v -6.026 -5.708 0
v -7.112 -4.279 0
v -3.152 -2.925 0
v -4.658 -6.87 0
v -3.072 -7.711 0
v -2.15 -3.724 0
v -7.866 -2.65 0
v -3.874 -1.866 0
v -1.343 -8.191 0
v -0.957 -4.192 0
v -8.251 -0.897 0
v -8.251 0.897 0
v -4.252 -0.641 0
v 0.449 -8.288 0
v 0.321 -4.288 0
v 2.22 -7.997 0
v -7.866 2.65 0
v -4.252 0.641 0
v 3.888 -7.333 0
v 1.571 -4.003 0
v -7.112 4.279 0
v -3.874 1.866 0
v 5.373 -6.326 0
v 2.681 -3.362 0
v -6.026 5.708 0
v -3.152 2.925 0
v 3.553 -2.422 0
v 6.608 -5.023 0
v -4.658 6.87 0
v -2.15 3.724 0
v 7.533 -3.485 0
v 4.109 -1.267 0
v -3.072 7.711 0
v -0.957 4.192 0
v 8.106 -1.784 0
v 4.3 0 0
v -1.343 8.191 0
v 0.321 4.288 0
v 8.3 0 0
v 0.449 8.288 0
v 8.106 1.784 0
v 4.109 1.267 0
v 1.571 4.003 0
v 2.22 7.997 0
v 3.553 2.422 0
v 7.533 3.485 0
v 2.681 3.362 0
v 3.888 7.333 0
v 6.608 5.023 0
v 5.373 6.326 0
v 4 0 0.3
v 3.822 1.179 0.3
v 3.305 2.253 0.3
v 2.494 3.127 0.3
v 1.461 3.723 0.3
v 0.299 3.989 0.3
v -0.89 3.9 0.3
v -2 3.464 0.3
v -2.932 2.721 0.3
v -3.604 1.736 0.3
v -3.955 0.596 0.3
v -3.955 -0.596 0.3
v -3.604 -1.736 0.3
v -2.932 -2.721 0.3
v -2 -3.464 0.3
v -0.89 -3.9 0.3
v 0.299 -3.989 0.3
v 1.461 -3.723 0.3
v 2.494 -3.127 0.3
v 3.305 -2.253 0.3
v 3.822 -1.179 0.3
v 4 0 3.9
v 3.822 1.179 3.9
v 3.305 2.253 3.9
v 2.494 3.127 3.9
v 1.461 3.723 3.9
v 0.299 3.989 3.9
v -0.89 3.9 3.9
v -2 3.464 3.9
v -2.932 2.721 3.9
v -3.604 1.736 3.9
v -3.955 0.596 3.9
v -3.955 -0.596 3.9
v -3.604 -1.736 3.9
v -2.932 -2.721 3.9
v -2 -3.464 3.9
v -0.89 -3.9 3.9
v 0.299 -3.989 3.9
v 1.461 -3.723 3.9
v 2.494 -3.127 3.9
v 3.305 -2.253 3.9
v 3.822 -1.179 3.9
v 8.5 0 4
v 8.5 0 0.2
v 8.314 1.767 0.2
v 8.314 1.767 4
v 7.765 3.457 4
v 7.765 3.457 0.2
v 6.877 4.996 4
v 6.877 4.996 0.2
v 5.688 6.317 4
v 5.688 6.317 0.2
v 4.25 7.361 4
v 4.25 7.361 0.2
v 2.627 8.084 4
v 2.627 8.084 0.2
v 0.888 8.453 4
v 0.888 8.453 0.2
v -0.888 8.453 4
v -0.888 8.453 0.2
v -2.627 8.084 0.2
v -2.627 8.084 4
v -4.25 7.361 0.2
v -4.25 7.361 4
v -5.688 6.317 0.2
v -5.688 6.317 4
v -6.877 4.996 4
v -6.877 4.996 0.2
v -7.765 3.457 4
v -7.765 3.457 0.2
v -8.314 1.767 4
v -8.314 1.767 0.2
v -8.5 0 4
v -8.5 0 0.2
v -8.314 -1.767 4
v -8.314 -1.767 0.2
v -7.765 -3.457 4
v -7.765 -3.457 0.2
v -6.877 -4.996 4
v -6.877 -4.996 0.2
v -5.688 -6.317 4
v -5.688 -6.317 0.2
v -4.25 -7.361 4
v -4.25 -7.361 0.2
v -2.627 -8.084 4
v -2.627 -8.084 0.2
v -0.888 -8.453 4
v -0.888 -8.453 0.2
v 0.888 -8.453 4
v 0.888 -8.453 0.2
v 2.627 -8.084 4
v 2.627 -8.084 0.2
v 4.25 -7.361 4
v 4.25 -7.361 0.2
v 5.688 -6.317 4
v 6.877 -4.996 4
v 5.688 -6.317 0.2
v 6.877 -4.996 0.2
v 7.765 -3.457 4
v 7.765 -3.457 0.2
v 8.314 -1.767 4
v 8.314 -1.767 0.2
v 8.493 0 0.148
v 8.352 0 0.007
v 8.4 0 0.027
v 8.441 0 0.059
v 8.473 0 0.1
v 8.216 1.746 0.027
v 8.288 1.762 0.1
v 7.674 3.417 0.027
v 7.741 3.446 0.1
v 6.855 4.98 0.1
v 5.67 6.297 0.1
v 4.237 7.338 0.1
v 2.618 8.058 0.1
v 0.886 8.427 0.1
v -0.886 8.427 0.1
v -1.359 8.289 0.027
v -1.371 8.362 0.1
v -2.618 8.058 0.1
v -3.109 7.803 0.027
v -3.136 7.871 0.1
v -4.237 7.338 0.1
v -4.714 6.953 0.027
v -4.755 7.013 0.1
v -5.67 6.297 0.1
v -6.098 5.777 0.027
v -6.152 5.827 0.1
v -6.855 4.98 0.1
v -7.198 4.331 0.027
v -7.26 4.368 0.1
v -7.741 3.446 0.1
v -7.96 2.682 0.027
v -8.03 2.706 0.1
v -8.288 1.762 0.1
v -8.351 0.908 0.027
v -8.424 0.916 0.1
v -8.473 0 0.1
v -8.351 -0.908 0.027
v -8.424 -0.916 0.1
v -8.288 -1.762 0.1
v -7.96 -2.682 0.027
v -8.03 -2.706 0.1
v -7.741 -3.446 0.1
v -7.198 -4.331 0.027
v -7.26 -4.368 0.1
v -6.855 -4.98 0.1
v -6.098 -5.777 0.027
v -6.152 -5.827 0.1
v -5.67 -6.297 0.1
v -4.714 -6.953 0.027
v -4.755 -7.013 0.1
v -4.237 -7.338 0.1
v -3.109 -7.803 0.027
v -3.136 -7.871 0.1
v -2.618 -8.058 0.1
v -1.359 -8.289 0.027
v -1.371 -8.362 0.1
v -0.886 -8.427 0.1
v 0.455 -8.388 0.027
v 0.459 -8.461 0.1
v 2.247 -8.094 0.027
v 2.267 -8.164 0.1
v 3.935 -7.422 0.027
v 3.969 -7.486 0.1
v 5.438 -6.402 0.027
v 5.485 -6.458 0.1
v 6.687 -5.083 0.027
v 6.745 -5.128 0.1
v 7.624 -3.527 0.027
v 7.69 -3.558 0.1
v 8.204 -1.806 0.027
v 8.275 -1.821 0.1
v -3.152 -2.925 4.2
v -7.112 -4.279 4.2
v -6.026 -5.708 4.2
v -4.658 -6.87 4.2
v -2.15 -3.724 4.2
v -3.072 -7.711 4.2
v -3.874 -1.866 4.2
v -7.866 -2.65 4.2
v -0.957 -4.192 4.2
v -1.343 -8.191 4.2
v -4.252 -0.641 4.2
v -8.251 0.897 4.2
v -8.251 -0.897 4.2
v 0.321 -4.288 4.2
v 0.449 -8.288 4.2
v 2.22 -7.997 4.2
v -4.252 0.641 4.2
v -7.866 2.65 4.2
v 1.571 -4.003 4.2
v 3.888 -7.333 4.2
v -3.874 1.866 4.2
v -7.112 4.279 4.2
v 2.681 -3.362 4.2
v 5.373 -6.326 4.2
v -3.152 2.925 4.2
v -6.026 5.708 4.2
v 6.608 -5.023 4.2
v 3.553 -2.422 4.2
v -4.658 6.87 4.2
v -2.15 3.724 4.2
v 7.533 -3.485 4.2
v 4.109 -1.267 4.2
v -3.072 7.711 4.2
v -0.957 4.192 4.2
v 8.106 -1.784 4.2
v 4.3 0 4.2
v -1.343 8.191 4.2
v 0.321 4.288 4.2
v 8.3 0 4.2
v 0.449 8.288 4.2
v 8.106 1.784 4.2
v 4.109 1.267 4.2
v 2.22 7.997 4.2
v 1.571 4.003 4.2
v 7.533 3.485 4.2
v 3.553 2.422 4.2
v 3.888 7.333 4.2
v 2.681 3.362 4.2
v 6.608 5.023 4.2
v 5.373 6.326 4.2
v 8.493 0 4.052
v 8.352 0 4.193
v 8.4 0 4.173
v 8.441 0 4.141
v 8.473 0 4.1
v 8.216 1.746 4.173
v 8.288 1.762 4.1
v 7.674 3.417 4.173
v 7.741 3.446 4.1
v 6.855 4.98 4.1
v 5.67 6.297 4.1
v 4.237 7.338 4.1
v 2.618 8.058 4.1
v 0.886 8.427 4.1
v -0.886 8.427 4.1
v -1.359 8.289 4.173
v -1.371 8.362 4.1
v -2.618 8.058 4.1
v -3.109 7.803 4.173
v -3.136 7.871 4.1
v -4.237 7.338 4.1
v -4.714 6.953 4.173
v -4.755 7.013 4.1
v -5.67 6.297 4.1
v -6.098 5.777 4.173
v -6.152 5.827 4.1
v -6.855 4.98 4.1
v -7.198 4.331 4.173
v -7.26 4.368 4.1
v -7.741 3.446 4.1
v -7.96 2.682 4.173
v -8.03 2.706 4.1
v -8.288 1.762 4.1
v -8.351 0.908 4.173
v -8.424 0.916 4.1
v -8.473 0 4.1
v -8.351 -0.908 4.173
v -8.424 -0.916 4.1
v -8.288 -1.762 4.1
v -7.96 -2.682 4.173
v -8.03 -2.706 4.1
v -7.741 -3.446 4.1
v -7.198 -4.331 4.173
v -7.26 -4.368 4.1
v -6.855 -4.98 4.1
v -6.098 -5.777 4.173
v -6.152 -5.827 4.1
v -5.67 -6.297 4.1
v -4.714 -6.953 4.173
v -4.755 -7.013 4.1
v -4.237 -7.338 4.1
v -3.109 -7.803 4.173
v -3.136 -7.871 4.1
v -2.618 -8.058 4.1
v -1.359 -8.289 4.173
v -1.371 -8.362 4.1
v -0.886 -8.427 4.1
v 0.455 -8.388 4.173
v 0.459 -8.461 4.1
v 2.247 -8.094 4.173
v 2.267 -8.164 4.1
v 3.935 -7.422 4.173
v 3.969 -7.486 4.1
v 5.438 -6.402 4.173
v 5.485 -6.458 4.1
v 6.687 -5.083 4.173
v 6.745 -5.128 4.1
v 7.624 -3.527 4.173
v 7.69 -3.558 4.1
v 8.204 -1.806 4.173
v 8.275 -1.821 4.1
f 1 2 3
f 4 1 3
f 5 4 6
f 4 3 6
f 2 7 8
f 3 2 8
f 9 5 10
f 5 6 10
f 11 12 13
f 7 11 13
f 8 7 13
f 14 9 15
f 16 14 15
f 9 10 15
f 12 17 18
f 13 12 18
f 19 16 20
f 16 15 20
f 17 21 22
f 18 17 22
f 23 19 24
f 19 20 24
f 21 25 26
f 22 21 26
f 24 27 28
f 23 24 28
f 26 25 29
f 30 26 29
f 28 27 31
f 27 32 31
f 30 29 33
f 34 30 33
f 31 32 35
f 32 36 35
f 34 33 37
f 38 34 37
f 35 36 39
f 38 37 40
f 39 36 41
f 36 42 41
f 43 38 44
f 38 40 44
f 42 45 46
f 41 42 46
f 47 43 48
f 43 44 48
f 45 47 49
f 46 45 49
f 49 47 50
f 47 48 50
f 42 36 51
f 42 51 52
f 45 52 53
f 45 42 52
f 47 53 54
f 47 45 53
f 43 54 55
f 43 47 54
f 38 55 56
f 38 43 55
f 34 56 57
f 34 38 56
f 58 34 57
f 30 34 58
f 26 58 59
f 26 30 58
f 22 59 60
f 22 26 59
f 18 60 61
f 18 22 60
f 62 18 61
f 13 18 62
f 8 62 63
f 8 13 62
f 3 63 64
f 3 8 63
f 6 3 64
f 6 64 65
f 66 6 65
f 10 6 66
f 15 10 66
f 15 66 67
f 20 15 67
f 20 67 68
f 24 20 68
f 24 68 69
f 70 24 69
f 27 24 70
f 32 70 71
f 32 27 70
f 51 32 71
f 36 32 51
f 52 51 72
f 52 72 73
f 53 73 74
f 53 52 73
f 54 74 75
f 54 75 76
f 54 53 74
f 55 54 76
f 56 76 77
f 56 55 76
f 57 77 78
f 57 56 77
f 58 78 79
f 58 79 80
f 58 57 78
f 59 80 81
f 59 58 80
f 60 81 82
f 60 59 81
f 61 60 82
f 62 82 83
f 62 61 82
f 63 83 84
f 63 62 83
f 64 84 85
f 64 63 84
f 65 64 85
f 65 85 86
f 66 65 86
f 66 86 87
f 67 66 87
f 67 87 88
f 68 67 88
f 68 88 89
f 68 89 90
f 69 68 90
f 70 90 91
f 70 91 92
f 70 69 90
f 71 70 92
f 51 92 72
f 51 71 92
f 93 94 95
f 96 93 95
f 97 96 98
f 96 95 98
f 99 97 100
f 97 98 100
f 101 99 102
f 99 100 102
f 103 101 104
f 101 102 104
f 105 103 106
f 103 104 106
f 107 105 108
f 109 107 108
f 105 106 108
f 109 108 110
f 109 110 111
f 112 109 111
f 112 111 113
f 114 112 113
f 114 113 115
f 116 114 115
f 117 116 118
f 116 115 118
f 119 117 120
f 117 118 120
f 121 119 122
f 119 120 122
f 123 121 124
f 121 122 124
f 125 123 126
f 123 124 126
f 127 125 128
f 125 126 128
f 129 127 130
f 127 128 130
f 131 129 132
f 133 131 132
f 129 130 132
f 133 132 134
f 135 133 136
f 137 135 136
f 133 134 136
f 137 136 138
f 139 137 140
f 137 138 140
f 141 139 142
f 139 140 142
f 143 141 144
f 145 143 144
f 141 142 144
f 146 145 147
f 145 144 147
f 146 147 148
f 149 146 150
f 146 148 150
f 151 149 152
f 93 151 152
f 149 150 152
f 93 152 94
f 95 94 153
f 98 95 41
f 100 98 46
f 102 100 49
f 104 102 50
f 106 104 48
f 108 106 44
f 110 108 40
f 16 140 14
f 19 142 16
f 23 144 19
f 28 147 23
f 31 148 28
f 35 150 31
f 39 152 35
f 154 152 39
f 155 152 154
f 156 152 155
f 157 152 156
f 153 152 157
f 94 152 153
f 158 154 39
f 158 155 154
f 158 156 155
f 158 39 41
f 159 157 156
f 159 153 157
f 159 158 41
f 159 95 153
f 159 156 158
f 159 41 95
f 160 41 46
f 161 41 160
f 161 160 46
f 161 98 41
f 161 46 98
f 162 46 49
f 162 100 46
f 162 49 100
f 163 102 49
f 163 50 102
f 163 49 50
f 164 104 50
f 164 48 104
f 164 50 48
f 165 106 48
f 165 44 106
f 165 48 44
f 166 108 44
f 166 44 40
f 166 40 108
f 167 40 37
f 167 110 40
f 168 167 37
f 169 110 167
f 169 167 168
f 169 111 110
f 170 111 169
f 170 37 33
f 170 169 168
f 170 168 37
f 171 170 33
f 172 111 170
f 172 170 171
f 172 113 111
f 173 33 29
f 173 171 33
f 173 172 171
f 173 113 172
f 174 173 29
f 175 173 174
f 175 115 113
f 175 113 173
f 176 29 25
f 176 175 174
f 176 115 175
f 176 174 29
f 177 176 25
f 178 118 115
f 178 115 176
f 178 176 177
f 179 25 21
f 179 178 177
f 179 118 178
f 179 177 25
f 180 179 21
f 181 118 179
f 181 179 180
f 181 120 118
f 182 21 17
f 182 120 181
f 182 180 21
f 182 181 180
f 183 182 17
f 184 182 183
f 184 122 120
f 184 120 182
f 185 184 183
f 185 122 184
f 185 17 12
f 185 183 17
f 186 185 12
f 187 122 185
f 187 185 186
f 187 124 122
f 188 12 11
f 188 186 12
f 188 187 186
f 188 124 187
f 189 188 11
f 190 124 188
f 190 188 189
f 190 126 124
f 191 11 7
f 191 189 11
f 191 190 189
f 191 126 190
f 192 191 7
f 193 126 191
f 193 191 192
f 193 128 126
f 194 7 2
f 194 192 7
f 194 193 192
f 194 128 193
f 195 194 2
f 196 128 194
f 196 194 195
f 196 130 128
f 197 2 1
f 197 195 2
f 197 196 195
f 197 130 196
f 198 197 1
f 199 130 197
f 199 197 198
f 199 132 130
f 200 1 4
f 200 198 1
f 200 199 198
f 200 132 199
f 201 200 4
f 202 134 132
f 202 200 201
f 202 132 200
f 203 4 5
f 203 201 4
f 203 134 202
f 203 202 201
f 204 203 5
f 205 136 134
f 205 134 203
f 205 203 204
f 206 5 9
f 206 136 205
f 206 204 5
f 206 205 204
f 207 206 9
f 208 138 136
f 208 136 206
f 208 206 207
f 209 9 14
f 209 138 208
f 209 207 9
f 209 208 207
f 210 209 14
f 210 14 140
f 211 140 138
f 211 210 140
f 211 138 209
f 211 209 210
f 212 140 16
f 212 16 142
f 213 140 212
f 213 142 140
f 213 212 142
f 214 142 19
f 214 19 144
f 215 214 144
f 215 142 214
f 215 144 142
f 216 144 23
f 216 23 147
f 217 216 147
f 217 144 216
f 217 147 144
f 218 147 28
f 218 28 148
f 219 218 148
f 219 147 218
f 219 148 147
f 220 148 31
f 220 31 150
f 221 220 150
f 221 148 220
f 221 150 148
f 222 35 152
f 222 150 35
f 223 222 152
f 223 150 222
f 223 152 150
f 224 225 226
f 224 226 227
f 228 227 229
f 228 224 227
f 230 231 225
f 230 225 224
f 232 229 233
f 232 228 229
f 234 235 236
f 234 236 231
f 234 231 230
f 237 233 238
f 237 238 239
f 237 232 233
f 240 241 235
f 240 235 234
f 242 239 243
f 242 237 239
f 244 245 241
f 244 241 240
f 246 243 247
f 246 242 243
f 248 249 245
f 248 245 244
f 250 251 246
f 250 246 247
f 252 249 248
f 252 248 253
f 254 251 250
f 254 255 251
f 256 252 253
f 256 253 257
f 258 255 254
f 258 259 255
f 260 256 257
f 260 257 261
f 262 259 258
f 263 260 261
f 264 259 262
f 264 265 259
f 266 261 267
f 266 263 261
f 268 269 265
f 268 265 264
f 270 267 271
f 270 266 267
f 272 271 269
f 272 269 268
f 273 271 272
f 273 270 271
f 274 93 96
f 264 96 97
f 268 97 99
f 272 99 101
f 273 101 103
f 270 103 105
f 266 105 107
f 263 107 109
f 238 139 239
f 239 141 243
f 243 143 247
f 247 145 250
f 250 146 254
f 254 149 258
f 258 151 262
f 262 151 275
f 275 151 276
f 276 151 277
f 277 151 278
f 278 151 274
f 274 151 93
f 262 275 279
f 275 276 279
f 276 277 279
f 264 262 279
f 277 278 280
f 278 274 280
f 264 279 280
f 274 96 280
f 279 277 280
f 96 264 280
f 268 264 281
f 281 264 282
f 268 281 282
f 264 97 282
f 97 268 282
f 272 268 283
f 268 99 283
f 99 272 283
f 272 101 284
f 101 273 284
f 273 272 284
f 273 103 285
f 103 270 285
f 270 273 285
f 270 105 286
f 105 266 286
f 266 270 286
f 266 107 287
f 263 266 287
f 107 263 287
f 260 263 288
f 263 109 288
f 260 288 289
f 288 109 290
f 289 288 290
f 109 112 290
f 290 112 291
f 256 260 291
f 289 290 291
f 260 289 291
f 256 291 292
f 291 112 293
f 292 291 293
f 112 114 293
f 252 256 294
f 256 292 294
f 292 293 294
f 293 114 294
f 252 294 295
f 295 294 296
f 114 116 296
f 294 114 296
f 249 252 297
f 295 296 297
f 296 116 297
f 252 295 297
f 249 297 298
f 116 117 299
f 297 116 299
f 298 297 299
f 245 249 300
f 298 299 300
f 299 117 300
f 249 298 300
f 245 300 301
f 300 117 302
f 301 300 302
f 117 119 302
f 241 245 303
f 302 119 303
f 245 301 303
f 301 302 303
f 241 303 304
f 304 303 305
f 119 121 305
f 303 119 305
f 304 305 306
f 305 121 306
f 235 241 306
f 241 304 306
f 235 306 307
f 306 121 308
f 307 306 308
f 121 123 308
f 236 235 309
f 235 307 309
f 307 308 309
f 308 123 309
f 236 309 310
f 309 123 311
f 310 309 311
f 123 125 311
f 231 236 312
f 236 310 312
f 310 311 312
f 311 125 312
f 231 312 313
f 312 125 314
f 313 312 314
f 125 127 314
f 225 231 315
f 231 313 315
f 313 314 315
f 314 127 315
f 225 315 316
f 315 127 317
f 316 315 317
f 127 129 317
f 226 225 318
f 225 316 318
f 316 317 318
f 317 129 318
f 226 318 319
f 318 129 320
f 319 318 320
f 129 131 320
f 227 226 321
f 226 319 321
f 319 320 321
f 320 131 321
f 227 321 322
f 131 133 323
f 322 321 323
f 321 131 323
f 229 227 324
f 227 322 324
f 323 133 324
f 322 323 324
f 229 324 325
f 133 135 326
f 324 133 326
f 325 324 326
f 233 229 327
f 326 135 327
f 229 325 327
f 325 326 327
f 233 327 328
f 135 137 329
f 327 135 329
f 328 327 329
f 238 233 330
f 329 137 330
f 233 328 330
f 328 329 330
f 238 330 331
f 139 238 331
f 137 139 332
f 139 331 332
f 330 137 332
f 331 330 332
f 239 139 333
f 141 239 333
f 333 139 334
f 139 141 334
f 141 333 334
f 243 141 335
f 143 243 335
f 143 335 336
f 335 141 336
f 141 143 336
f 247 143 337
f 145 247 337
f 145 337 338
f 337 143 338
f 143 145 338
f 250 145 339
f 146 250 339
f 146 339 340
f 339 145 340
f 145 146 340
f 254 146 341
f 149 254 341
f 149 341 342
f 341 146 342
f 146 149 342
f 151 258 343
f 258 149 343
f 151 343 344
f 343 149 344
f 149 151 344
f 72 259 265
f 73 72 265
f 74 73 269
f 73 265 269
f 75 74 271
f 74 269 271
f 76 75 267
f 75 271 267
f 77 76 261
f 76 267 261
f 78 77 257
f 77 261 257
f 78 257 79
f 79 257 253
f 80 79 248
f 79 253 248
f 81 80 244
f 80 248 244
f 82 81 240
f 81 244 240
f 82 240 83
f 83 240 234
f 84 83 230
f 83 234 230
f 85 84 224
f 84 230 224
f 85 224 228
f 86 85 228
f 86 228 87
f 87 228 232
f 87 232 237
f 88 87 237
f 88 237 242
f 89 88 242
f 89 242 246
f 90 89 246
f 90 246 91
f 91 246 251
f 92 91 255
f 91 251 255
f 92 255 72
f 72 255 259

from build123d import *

# Parameters (mm, degrees)
SKETCH1_R           = 8.5
SKETCH1_R_2         = 4
BOSS_EXTRUDE1_DEPTH = 4.2
CHAMFER1_SIZE       = 0.3
FILLET1_R           = 0.2


with BuildPart() as part:
    # Sketch1 → Boss-Extrude1 (new body)
    with BuildSketch(Plane.XY):
        Circle(SKETCH1_R)
        Circle(SKETCH1_R_2, mode=Mode.SUBTRACT)
    extrude(amount=BOSS_EXTRUDE1_DEPTH)

    # Chamfer1
    chamfer1_edges = [part.edges().sort_by_distance(p)[0] for p in [
        (-4, 0, 0),
        (-4, 0, 4.2),
    ]]
    chamfer(chamfer1_edges, length=CHAMFER1_SIZE)

    # Fillet1
    fillet1_edges = [part.edges().sort_by_distance(p)[0] for p in [
        (-8.5, 0, 0),
        (-8.5, 0, 4.2),
    ]]
    fillet(fillet1_edges, radius=FILLET1_R)


solid = part.part
